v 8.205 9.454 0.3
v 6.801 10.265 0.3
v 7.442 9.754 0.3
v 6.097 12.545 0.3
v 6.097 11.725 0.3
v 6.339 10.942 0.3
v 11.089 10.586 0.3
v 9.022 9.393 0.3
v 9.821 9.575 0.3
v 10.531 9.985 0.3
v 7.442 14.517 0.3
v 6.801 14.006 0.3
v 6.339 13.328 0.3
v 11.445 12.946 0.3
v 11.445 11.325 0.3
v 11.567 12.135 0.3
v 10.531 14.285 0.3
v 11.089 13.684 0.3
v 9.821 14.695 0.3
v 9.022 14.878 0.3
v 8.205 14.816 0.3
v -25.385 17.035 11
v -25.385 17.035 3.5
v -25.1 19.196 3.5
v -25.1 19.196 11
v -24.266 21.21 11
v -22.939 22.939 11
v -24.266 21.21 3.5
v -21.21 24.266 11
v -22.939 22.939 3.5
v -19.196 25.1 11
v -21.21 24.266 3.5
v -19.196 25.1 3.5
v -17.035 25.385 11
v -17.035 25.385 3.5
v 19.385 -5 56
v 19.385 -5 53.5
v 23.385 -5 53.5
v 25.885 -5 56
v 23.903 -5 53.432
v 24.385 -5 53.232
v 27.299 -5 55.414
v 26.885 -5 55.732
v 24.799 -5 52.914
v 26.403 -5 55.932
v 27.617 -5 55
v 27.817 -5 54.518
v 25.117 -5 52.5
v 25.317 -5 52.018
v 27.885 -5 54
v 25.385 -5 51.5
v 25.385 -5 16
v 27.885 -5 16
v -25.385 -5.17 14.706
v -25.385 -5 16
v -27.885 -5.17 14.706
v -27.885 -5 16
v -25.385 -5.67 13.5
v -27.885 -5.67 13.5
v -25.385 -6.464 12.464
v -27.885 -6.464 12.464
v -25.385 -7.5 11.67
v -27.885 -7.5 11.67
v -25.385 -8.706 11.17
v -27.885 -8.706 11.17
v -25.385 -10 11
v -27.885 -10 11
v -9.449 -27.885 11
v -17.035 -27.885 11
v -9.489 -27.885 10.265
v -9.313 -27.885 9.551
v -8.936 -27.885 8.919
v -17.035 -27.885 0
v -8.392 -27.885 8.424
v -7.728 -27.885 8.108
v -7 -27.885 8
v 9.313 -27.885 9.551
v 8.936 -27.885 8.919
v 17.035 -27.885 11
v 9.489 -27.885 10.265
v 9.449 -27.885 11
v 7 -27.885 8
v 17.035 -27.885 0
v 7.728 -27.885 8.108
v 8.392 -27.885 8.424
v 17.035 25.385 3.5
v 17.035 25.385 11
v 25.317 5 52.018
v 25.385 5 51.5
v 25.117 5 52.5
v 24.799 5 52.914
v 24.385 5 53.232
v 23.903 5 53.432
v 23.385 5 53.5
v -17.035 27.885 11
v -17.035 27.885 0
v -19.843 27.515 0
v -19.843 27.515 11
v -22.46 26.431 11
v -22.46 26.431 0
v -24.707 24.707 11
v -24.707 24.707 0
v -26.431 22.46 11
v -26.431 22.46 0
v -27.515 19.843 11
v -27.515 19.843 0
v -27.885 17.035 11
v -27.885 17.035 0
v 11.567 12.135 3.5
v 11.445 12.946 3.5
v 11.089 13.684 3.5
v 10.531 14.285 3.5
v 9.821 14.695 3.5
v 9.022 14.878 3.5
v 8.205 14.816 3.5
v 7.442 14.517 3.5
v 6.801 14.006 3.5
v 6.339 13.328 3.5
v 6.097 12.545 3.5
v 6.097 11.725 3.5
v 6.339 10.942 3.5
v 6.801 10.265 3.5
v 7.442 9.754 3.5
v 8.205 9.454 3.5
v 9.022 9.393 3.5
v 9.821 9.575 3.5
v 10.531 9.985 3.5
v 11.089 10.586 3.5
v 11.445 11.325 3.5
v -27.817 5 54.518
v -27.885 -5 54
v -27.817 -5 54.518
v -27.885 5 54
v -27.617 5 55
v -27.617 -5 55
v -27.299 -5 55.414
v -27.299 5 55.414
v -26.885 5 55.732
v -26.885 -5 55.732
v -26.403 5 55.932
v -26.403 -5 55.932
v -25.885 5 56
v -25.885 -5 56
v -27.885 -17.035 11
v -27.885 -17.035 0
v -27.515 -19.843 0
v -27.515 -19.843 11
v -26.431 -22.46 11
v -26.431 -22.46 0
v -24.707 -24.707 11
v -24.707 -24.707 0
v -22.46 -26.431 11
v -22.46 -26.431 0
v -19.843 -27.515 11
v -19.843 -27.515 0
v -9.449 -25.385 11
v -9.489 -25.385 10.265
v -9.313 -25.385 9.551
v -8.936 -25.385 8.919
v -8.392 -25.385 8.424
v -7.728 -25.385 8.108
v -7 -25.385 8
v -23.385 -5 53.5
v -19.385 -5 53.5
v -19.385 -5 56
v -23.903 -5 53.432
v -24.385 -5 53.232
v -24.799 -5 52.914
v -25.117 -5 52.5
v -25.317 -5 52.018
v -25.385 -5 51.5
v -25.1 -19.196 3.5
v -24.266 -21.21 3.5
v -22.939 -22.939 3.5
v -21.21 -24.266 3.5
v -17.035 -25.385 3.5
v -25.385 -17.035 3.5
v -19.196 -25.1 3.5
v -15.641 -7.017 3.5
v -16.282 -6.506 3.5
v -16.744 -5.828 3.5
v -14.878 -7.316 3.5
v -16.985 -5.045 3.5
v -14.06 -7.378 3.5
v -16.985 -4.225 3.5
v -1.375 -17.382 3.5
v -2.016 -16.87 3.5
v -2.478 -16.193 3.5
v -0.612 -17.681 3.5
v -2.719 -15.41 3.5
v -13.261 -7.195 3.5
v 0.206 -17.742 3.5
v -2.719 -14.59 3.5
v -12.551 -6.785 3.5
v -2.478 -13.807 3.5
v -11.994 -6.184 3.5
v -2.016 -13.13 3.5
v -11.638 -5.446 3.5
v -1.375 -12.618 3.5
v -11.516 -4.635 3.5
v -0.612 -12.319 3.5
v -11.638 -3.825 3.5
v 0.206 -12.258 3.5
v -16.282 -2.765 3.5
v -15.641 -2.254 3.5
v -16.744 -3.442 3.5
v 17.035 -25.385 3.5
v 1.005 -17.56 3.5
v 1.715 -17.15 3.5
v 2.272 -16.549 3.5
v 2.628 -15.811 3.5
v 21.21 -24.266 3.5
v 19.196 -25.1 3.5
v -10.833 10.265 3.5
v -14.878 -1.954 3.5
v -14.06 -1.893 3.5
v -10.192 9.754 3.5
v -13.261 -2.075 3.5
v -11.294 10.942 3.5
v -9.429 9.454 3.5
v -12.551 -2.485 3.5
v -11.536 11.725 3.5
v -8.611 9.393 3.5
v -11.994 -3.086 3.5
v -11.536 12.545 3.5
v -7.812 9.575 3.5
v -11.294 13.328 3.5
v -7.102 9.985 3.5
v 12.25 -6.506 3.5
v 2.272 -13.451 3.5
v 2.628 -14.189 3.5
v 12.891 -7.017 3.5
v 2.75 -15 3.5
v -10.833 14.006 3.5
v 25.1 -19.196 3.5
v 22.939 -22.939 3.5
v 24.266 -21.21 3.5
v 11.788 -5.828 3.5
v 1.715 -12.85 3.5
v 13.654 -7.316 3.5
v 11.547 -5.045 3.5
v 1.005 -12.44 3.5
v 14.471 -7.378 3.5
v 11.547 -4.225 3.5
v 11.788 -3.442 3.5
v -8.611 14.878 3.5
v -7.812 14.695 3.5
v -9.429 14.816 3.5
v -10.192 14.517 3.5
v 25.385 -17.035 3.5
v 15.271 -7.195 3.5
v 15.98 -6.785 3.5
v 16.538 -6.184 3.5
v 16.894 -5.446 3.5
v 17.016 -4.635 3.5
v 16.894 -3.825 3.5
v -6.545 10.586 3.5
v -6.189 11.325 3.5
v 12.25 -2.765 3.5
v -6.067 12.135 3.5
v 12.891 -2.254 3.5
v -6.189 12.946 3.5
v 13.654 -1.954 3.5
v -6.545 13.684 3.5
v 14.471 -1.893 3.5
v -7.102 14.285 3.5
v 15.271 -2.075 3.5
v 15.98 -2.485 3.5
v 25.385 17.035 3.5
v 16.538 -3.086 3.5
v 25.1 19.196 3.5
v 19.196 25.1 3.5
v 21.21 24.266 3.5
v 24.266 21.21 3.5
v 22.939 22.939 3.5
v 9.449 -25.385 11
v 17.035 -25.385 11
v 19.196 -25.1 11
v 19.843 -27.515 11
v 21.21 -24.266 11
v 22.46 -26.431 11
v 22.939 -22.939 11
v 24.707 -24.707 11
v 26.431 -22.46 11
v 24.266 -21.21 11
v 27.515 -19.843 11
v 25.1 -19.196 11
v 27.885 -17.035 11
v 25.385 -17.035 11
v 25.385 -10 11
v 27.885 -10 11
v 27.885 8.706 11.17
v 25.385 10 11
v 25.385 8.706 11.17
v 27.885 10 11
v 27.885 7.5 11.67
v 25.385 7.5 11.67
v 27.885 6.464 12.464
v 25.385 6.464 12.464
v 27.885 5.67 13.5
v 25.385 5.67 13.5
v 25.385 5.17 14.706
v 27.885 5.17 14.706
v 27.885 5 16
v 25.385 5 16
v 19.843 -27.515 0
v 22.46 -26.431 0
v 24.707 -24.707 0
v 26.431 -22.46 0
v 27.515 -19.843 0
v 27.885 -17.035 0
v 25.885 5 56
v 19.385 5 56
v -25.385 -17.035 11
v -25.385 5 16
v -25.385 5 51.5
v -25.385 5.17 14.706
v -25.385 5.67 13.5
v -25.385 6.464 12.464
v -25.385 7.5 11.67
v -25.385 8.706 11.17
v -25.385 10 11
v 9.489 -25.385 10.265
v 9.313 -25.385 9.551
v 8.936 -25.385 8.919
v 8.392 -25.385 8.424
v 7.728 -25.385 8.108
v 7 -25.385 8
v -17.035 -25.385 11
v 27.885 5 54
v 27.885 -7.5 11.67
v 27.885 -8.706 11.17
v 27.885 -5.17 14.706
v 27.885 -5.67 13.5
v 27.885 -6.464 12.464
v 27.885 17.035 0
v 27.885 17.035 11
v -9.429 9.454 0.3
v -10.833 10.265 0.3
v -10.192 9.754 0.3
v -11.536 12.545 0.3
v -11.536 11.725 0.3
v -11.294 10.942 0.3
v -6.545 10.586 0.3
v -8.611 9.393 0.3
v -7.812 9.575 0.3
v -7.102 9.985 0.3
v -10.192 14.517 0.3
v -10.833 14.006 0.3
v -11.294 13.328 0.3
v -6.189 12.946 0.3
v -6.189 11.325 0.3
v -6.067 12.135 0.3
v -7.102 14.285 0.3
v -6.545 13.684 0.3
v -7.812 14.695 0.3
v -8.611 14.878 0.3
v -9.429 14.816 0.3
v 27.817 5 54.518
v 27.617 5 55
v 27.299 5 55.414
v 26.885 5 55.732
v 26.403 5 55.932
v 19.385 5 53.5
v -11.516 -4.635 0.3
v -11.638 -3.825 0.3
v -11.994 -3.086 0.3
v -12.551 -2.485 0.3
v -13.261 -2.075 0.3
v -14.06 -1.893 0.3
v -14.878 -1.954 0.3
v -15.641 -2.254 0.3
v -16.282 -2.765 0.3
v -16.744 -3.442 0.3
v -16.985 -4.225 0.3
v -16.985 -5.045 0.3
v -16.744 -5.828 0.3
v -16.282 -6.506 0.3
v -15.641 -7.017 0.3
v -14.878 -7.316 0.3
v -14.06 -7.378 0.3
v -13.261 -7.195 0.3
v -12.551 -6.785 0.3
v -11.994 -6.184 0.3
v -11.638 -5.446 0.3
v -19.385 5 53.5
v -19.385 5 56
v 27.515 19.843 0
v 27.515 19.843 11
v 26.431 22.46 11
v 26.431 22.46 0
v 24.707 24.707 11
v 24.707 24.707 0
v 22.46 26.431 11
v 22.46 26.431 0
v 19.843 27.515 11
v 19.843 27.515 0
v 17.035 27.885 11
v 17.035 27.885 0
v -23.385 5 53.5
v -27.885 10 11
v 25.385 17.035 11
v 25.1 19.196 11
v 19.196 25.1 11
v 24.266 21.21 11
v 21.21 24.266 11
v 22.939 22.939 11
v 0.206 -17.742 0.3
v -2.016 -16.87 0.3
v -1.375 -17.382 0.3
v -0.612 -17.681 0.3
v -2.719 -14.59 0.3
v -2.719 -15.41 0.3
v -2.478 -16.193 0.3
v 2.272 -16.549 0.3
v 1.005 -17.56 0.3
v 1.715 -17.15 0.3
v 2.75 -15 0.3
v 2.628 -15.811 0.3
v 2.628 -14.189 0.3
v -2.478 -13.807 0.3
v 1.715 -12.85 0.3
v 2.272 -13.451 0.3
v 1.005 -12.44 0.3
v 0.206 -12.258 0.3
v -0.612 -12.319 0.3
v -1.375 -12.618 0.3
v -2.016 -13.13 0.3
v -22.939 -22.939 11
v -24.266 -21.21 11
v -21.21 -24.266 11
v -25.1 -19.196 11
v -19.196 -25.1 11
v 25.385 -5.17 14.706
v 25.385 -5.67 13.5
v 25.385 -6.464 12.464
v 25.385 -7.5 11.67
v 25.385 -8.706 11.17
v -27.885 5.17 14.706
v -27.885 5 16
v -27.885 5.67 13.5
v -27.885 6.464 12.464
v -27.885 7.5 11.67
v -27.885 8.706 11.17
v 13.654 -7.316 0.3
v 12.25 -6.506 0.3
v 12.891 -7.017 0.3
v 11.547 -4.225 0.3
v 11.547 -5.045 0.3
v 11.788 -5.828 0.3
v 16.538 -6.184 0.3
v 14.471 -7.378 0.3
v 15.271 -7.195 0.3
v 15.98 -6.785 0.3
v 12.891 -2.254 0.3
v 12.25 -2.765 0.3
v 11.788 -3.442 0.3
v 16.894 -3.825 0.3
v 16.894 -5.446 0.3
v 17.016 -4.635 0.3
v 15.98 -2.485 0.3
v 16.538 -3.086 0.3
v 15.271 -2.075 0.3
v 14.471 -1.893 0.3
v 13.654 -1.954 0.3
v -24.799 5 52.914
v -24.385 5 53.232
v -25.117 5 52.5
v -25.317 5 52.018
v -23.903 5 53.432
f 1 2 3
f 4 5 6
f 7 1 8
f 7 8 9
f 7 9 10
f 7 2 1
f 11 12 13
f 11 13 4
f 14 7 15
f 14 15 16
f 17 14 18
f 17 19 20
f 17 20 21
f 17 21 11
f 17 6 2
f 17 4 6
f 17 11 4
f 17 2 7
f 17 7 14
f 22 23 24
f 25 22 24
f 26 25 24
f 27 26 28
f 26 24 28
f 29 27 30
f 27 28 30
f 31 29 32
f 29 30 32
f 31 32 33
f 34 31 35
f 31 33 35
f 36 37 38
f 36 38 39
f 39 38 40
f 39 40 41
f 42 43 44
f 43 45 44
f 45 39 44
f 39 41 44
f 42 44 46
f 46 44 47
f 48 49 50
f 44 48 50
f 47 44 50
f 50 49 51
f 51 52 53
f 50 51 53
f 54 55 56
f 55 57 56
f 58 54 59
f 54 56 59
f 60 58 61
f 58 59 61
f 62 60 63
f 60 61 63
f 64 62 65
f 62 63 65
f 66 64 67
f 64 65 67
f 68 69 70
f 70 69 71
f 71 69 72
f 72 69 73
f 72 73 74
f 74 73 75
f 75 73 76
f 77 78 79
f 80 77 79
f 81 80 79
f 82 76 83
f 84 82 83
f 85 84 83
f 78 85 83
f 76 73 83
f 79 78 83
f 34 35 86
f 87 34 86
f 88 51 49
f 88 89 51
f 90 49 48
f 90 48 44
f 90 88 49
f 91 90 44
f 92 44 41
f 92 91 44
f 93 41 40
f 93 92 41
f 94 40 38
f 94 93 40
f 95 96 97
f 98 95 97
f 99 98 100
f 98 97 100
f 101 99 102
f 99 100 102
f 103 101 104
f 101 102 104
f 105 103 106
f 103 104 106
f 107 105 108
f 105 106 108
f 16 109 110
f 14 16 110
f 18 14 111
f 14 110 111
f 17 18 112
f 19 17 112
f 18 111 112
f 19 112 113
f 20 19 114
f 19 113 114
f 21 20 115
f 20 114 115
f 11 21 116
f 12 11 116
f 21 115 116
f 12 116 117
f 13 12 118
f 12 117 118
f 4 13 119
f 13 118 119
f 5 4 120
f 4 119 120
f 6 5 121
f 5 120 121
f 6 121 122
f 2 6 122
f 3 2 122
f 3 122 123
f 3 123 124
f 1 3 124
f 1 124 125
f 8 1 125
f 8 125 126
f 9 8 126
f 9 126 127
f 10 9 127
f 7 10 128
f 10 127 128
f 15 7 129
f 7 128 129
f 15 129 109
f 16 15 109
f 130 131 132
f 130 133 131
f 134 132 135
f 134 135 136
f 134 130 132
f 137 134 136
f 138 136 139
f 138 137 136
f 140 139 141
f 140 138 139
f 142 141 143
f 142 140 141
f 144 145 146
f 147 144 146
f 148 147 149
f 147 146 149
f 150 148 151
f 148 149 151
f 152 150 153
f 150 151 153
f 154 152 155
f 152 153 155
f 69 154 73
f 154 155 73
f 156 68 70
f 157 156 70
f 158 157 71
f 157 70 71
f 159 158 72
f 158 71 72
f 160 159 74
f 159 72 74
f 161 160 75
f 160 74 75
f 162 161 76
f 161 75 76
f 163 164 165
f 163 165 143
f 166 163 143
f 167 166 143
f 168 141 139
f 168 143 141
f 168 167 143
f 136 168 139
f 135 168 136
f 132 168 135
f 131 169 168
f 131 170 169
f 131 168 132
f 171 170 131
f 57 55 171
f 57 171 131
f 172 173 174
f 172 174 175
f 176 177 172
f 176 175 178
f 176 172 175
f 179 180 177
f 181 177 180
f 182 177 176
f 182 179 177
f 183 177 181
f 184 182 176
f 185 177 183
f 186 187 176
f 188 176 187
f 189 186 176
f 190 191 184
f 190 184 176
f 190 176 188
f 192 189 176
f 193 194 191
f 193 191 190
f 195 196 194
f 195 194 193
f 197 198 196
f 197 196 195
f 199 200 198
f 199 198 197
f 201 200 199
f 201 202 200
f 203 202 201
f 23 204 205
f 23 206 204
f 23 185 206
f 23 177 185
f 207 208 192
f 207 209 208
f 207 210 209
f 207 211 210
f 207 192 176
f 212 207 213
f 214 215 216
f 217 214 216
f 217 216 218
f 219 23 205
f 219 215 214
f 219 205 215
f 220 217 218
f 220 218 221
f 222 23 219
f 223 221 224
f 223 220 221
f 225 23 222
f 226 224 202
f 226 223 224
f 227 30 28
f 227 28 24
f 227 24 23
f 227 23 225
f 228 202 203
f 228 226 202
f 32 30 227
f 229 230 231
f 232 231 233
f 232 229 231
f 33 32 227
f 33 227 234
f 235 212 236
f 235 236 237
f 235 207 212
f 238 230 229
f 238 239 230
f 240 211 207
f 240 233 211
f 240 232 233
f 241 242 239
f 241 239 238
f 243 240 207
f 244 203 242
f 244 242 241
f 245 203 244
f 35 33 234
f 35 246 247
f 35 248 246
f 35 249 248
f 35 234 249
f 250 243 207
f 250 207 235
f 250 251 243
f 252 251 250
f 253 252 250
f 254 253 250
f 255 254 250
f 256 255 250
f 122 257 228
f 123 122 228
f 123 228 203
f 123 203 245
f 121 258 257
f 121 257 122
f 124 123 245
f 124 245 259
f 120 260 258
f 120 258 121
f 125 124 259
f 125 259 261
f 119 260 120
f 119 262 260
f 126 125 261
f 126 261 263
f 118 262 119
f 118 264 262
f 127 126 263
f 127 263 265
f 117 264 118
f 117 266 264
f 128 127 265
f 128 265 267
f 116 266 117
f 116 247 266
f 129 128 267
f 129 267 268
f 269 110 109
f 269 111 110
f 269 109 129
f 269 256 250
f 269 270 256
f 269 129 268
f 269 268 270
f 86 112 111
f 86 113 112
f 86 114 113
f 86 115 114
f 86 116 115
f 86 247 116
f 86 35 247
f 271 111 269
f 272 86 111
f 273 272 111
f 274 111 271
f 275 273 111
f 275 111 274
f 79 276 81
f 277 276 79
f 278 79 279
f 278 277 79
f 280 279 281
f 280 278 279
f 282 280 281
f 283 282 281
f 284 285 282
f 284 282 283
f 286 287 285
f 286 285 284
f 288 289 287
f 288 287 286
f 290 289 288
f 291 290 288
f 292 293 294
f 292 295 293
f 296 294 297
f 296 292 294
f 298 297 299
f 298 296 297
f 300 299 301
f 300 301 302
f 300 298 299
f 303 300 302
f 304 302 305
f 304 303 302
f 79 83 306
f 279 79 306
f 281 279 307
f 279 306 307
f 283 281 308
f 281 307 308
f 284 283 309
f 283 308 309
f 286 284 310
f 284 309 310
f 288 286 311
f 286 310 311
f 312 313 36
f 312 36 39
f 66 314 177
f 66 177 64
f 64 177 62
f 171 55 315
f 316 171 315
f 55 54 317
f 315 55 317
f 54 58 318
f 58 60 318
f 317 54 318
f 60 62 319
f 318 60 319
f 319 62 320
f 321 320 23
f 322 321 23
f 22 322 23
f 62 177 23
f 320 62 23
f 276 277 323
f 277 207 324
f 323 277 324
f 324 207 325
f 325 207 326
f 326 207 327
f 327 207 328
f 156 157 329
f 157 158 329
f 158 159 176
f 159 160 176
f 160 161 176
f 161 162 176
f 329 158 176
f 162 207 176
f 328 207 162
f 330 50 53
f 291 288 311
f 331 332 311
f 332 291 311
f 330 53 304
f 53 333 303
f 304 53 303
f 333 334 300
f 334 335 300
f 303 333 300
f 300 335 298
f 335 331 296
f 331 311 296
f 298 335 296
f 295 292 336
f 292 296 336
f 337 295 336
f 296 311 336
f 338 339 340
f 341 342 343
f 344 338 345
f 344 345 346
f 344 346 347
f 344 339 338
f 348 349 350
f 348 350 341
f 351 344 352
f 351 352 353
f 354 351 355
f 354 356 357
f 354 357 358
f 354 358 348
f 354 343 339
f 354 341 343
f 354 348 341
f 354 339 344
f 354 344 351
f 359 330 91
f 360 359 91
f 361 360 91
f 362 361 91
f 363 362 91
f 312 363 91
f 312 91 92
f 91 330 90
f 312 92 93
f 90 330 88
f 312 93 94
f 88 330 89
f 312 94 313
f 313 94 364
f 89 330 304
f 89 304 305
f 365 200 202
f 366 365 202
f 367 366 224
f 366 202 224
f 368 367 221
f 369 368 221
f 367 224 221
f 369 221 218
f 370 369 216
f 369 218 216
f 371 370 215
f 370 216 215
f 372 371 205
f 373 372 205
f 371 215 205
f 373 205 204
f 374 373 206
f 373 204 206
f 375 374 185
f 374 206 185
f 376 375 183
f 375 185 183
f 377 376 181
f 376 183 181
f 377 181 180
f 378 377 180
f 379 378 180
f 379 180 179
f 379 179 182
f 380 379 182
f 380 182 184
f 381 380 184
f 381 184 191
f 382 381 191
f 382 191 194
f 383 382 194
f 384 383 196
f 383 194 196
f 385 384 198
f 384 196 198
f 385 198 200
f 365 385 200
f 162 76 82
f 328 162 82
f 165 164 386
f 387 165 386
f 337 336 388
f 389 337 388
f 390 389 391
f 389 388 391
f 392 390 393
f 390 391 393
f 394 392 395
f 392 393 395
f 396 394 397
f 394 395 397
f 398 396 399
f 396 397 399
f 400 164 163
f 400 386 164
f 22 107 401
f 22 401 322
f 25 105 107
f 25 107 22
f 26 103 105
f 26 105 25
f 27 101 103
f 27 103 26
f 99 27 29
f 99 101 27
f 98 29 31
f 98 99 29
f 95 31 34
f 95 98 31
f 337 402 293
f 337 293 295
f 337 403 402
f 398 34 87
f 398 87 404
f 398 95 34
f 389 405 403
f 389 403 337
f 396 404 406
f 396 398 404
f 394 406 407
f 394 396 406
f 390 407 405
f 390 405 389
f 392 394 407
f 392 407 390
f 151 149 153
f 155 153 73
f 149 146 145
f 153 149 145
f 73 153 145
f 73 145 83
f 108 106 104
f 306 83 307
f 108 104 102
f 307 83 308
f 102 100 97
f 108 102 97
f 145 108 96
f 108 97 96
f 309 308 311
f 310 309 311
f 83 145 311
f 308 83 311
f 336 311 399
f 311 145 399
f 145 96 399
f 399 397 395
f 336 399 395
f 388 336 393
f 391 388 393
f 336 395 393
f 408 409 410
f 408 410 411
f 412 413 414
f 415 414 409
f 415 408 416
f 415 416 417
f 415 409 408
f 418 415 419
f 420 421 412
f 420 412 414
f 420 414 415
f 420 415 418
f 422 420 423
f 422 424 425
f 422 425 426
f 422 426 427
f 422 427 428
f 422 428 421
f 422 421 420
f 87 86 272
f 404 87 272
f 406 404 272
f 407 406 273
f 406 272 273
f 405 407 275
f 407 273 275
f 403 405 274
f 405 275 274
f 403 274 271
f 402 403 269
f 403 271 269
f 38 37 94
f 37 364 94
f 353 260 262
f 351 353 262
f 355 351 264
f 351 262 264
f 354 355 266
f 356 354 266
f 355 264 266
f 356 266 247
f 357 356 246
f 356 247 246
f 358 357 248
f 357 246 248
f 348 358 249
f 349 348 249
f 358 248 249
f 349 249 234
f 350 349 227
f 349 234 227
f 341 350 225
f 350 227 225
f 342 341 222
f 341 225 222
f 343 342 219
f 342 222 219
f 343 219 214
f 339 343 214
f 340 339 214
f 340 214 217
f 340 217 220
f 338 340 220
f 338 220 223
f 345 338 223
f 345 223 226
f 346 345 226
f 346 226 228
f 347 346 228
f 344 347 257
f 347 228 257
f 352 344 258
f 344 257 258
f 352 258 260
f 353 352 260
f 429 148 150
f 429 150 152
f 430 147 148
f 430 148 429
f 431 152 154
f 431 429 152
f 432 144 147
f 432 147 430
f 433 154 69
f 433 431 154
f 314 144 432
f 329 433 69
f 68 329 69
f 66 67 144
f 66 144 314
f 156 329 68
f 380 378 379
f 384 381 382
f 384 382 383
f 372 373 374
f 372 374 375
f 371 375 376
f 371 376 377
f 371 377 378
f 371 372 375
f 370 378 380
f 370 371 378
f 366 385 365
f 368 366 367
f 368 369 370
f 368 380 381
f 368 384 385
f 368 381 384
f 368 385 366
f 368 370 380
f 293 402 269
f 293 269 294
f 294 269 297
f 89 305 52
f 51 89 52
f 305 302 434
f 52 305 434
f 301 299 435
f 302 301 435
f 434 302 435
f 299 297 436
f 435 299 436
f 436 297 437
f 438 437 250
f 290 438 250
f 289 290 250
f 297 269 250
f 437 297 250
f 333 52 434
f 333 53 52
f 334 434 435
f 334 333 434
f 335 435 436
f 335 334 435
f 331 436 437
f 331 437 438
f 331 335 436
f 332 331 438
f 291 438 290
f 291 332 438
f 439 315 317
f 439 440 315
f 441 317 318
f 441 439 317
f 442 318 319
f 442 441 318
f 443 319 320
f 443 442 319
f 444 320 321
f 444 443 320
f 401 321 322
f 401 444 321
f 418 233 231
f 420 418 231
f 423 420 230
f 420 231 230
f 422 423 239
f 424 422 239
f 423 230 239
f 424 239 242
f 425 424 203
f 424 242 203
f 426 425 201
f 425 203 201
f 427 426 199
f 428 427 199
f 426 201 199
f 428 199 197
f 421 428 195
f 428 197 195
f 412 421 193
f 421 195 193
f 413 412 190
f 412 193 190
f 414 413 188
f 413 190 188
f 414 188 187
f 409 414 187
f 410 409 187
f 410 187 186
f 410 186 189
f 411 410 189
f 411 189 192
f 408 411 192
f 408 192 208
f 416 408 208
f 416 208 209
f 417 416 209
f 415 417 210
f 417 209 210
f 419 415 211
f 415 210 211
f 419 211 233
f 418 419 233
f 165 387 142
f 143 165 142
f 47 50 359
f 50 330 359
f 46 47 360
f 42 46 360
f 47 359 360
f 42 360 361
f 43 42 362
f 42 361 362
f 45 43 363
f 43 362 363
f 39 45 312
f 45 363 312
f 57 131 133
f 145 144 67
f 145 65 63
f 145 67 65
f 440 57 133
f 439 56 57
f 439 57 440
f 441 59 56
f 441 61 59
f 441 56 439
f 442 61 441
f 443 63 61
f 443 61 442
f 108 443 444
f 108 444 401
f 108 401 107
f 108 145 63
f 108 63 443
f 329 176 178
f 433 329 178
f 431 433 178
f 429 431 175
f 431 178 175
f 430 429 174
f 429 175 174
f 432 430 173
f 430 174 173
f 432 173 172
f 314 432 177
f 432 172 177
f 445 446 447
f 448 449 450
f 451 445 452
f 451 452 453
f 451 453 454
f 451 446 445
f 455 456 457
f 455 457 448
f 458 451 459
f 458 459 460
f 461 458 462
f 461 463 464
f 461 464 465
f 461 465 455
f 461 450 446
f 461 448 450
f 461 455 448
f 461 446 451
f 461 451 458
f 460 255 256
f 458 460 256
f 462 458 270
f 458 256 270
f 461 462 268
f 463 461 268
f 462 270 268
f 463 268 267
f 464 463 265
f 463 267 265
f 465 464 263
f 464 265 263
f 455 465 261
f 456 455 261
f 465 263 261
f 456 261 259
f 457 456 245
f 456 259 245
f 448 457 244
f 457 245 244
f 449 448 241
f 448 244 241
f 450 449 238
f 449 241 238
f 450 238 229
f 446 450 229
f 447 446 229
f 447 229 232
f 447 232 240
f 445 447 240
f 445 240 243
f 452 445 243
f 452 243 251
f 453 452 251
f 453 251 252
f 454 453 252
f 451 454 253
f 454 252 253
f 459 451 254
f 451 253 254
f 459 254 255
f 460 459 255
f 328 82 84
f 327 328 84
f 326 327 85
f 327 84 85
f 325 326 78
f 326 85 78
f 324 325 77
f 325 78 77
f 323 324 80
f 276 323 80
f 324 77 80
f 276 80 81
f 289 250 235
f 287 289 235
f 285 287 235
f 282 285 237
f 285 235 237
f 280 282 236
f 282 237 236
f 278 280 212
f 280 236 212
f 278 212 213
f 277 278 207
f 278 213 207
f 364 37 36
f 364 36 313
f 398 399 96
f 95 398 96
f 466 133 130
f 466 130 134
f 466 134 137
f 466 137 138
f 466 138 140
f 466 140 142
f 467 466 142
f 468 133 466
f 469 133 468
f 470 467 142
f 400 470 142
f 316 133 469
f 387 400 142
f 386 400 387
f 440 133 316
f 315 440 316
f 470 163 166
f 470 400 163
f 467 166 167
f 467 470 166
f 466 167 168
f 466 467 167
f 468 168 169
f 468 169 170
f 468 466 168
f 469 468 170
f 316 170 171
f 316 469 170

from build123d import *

# Parameters (mm, degrees)
F1_DEPTH  = 3.5
F2_DEPTH  = 11
F4_DEPTH  = 25
F5_W      = 2.5
F5_H      = 10
F6_DEPTH  = 42.5
F7_W      = 2.5
F7_H      = 10
F7_W_2    = 6
F8_DEPTH  = 2.5
F9_R      = 2
F10_R     = 5
F11_R     = 2.75
F12_DEPTH = 3.2


# Not quite as in the source:
# - a pattern or mirror of a feature is missing from the dataset's text; its kind, count and spacing are read off the source's solid


with BuildPart() as f1:
    # F0 (on Top) → F1 (new body)
    with BuildSketch(Plane.XY):
        with BuildLine():
            ThreePointArc((25.385, 17.035), (22.9393416229, 22.9393416229), (17.035, 25.385))
            Line((17.035, 25.385), (-17.035, 25.385))
            ThreePointArc((-17.035, 25.385), (-22.9393416229, 22.9393416229), (-25.385, 17.035))
            Line((-25.385, 17.035), (-25.385, -17.035))
            ThreePointArc((-25.385, -17.035), (-22.9393416229, -22.9393416229), (-17.035, -25.385))
            Line((-17.035, -25.385), (17.035, -25.385))
            ThreePointArc((17.035, -25.385), (22.9393416229, -22.9393416229), (25.385, -17.035))
            Line((25.385, -17.035), (25.385, 17.035))
        make_face()
    extrude(amount=F1_DEPTH)

    # F0 (on Top) → F2 (join)
    with BuildSketch(Plane.XY):
        with BuildLine():
            ThreePointArc((27.885, 17.035), (24.7071085759, 24.7071085759), (17.035, 27.885))
            Line((17.035, 27.885), (-17.035, 27.885))
            ThreePointArc((-17.035, 27.885), (-24.7071085759, 24.7071085759), (-27.885, 17.035))
            Line((-27.885, 17.035), (-27.885, -17.035))
            ThreePointArc((-27.885, -17.035), (-24.7071085759, -24.7071085759), (-17.035, -27.885))
            Line((-17.035, -27.885), (17.035, -27.885))
            ThreePointArc((17.035, -27.885), (24.7071085759, -24.7071085759), (27.885, -17.035))
            Line((27.885, -17.035), (27.885, 17.035))
        make_face()
        with BuildLine():
            Line((-17.035, 25.385), (17.035, 25.385))
            ThreePointArc((17.035, 25.385), (22.9393416229, 22.9393416229), (25.385, 17.035))
            Line((25.385, 17.035), (25.385, -17.035))
            ThreePointArc((25.385, -17.035), (22.9393416229, -22.9393416229), (17.035, -25.385))
            Line((17.035, -25.385), (-17.035, -25.385))
            ThreePointArc((-17.035, -25.385), (-22.9393416229, -22.9393416229), (-25.385, -17.035))
            Line((-25.385, -17.035), (-25.385, 17.035))
            ThreePointArc((-25.385, 17.035), (-22.9393416229, 22.9393416229), (-17.035, 25.385))
        make_face(mode=Mode.SUBTRACT)
    extrude(amount=F2_DEPTH)

    # F3 (on face) → F4 (cut)
    with BuildSketch(Plane.XZ.offset(27.885)):
        with BuildLine():
            ThreePointArc((-9.4494897428, 11), (-8.9364916731, 8.9188611699), (-7, 8))
            Line((-7, 8), (7, 8))
            ThreePointArc((7, 8), (8.9364916731, 8.9188611699), (9.4494897428, 11))
            Line((9.4494897428, 11), (-9.4494897428, 11))
        make_face()
        with BuildLine():
            ThreePointArc((-7, 13), (-8.5811388301, 12.4364916731), (-9.4494897428, 11))
            Line((-9.4494897428, 11), (9.4494897428, 11))
            ThreePointArc((9.4494897428, 11), (8.5811388301, 12.4364916731), (7, 13))
            Line((7, 13), (-7, 13))
        make_face()
    extrude(amount=-F4_DEPTH, mode=Mode.SUBTRACT)

    # F5 (on face) → F6 (join)
    with BuildSketch(Plane.XY.offset(11)):
        with Locations((26.635, 0)):
            Rectangle(F5_W, F5_H)
    f6 = extrude(amount=F6_DEPTH)

    # F6_copies: F6 across plane
    add(f6.mirror(Plane(origin=(0, 0, 0), x_dir=(0, 0, -1), z_dir=(-1, 0, 0))))

    # F7 (on face) → F8 (join)
    with BuildSketch(Plane.XY.offset(53.5)):
        with Locations((26.635, 0)):
            Rectangle(F7_W, F7_H)
        with Locations((22.385, 0)):
            Rectangle(F7_W_2, F7_H)
    f8 = extrude(amount=F8_DEPTH)

    # F8_copies: F8 across plane
    add(f8.mirror(Plane(origin=(0, 0, 0), x_dir=(0, 0, -1), z_dir=(-1, 0, 0))))

    # F9
    f9_edges = [f1.edges().sort_by_distance(p)[0] for p in [
        (25.385, 0, 53.5),
        (27.885, 0, 56),
        (-25.385, 0, 53.5),
        (-27.885, 0, 56),
    ]]
    fillet(f9_edges, radius=F9_R)

    # F10
    f10_edges = [f1.edges().sort_by_distance(p)[0] for p in [
        (26.635, 5, 11),
        (26.635, -5, 11),
        (-26.635, 5, 11),
        (-26.635, -5, 11),
    ]]
    fillet(f10_edges, radius=F10_R)

    # F11 (on face) → F12 (cut)
    with BuildSketch(Plane.XY.offset(3.5)):
        with Locations((0, -15)):
            Circle(F11_R)
        with Locations((14.2658477444, -4.6352549156)):
            Circle(F11_R)
        with Locations((8.8167787844, 12.1352549156)):
            Circle(F11_R)
        with Locations((-8.8167787844, 12.1352549156)):
            Circle(F11_R)
        with Locations((-14.2658477444, -4.6352549156)):
            Circle(F11_R)
    extrude(amount=-F12_DEPTH, mode=Mode.SUBTRACT)


solid = f1.part
